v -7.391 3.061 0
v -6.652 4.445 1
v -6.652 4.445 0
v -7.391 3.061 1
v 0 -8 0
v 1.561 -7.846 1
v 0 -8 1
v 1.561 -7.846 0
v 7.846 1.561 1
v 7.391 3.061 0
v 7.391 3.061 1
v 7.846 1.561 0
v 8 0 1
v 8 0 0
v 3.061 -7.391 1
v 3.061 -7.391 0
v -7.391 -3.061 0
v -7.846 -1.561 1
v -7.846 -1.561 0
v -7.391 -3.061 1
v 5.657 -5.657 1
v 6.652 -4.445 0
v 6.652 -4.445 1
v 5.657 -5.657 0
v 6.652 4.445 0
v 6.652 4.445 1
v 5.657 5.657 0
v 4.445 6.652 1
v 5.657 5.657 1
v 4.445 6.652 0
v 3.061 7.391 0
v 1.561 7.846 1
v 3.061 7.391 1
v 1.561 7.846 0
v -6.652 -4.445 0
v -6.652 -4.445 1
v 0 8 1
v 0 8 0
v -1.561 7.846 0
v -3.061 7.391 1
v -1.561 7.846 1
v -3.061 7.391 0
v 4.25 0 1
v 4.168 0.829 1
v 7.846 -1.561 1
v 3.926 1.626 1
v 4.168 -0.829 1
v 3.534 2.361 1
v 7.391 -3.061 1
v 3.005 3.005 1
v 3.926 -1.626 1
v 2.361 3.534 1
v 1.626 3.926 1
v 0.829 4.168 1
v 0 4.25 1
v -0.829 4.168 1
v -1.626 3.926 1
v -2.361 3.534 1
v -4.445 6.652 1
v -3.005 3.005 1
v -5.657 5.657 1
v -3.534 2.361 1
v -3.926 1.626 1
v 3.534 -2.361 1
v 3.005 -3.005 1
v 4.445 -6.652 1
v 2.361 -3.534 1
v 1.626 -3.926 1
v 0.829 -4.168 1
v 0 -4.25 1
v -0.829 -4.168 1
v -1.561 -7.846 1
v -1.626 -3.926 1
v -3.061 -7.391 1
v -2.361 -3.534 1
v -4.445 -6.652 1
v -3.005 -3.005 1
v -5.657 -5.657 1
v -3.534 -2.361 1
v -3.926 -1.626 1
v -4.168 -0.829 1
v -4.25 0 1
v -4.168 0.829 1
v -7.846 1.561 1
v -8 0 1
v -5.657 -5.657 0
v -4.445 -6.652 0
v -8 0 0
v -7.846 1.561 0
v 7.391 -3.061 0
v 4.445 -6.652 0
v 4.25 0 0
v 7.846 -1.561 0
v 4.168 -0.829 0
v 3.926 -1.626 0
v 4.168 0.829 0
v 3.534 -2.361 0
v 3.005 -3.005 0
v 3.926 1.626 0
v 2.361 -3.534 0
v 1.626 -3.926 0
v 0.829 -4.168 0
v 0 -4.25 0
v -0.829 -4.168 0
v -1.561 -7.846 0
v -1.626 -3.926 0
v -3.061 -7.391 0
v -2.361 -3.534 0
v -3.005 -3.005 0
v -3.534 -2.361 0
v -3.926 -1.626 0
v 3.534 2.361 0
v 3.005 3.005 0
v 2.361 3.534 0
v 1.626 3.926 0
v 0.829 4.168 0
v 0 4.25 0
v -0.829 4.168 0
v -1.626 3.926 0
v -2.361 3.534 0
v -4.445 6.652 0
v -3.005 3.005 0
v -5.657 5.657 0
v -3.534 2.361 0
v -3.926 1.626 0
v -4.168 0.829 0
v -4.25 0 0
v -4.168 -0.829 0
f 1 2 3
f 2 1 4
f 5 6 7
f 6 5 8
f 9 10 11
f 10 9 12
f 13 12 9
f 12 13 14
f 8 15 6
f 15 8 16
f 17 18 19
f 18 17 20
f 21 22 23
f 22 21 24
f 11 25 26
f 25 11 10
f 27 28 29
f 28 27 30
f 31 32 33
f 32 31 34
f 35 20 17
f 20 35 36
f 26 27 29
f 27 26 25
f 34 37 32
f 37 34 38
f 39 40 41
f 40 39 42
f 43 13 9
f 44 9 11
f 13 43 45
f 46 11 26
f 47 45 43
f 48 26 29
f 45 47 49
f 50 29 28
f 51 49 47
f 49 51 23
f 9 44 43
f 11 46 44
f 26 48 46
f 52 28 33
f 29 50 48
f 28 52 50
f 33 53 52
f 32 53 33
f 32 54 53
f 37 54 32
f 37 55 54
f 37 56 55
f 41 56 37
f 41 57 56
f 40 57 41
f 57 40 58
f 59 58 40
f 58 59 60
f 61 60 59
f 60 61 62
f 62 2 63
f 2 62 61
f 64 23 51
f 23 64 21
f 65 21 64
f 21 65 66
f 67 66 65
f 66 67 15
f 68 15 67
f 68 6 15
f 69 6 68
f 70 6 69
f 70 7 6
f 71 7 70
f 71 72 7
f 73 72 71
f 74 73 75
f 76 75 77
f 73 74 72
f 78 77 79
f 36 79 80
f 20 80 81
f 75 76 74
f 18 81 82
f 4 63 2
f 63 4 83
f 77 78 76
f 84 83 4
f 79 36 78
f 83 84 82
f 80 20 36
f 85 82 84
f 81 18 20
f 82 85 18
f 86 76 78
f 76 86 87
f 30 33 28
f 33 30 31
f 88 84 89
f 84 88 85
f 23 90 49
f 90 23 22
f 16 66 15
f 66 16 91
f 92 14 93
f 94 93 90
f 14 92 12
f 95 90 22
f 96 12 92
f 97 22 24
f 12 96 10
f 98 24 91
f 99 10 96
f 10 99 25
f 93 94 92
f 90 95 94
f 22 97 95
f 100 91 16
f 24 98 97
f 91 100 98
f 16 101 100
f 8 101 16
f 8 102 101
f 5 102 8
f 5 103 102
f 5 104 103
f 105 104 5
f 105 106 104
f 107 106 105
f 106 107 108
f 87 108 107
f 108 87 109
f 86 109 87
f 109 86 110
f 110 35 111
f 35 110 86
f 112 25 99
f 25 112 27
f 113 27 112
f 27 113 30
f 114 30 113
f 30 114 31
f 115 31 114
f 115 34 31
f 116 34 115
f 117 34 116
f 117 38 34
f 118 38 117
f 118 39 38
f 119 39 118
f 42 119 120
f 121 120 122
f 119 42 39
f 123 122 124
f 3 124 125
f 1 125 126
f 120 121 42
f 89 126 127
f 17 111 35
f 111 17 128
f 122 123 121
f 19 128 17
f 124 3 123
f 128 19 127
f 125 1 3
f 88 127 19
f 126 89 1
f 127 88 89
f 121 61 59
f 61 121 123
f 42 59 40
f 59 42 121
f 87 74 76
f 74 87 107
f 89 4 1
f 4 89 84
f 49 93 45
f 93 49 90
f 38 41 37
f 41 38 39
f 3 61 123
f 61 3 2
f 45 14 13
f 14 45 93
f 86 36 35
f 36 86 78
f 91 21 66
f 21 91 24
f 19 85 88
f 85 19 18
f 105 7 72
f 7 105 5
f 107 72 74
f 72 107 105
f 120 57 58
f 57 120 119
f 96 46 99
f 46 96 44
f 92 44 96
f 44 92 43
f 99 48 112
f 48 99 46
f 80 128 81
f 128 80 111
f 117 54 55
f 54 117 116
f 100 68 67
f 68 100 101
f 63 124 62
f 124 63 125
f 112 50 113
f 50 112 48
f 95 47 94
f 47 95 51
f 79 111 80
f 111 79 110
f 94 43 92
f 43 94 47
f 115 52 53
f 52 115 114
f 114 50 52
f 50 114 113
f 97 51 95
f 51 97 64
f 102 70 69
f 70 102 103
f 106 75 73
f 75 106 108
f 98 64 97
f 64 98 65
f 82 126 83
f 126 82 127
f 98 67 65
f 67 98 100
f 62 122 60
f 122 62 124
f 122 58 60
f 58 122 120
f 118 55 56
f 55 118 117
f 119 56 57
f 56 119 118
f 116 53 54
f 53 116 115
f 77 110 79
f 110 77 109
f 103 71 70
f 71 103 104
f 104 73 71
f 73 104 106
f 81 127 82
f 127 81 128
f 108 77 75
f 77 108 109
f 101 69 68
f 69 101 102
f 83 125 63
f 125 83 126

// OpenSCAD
// Purchased hardware envelope; no modeled threads, not print.
$fn=32;
difference(){cylinder(d=16,h=1);translate([0,0,-1])cylinder(d=8.5,h=3);}
